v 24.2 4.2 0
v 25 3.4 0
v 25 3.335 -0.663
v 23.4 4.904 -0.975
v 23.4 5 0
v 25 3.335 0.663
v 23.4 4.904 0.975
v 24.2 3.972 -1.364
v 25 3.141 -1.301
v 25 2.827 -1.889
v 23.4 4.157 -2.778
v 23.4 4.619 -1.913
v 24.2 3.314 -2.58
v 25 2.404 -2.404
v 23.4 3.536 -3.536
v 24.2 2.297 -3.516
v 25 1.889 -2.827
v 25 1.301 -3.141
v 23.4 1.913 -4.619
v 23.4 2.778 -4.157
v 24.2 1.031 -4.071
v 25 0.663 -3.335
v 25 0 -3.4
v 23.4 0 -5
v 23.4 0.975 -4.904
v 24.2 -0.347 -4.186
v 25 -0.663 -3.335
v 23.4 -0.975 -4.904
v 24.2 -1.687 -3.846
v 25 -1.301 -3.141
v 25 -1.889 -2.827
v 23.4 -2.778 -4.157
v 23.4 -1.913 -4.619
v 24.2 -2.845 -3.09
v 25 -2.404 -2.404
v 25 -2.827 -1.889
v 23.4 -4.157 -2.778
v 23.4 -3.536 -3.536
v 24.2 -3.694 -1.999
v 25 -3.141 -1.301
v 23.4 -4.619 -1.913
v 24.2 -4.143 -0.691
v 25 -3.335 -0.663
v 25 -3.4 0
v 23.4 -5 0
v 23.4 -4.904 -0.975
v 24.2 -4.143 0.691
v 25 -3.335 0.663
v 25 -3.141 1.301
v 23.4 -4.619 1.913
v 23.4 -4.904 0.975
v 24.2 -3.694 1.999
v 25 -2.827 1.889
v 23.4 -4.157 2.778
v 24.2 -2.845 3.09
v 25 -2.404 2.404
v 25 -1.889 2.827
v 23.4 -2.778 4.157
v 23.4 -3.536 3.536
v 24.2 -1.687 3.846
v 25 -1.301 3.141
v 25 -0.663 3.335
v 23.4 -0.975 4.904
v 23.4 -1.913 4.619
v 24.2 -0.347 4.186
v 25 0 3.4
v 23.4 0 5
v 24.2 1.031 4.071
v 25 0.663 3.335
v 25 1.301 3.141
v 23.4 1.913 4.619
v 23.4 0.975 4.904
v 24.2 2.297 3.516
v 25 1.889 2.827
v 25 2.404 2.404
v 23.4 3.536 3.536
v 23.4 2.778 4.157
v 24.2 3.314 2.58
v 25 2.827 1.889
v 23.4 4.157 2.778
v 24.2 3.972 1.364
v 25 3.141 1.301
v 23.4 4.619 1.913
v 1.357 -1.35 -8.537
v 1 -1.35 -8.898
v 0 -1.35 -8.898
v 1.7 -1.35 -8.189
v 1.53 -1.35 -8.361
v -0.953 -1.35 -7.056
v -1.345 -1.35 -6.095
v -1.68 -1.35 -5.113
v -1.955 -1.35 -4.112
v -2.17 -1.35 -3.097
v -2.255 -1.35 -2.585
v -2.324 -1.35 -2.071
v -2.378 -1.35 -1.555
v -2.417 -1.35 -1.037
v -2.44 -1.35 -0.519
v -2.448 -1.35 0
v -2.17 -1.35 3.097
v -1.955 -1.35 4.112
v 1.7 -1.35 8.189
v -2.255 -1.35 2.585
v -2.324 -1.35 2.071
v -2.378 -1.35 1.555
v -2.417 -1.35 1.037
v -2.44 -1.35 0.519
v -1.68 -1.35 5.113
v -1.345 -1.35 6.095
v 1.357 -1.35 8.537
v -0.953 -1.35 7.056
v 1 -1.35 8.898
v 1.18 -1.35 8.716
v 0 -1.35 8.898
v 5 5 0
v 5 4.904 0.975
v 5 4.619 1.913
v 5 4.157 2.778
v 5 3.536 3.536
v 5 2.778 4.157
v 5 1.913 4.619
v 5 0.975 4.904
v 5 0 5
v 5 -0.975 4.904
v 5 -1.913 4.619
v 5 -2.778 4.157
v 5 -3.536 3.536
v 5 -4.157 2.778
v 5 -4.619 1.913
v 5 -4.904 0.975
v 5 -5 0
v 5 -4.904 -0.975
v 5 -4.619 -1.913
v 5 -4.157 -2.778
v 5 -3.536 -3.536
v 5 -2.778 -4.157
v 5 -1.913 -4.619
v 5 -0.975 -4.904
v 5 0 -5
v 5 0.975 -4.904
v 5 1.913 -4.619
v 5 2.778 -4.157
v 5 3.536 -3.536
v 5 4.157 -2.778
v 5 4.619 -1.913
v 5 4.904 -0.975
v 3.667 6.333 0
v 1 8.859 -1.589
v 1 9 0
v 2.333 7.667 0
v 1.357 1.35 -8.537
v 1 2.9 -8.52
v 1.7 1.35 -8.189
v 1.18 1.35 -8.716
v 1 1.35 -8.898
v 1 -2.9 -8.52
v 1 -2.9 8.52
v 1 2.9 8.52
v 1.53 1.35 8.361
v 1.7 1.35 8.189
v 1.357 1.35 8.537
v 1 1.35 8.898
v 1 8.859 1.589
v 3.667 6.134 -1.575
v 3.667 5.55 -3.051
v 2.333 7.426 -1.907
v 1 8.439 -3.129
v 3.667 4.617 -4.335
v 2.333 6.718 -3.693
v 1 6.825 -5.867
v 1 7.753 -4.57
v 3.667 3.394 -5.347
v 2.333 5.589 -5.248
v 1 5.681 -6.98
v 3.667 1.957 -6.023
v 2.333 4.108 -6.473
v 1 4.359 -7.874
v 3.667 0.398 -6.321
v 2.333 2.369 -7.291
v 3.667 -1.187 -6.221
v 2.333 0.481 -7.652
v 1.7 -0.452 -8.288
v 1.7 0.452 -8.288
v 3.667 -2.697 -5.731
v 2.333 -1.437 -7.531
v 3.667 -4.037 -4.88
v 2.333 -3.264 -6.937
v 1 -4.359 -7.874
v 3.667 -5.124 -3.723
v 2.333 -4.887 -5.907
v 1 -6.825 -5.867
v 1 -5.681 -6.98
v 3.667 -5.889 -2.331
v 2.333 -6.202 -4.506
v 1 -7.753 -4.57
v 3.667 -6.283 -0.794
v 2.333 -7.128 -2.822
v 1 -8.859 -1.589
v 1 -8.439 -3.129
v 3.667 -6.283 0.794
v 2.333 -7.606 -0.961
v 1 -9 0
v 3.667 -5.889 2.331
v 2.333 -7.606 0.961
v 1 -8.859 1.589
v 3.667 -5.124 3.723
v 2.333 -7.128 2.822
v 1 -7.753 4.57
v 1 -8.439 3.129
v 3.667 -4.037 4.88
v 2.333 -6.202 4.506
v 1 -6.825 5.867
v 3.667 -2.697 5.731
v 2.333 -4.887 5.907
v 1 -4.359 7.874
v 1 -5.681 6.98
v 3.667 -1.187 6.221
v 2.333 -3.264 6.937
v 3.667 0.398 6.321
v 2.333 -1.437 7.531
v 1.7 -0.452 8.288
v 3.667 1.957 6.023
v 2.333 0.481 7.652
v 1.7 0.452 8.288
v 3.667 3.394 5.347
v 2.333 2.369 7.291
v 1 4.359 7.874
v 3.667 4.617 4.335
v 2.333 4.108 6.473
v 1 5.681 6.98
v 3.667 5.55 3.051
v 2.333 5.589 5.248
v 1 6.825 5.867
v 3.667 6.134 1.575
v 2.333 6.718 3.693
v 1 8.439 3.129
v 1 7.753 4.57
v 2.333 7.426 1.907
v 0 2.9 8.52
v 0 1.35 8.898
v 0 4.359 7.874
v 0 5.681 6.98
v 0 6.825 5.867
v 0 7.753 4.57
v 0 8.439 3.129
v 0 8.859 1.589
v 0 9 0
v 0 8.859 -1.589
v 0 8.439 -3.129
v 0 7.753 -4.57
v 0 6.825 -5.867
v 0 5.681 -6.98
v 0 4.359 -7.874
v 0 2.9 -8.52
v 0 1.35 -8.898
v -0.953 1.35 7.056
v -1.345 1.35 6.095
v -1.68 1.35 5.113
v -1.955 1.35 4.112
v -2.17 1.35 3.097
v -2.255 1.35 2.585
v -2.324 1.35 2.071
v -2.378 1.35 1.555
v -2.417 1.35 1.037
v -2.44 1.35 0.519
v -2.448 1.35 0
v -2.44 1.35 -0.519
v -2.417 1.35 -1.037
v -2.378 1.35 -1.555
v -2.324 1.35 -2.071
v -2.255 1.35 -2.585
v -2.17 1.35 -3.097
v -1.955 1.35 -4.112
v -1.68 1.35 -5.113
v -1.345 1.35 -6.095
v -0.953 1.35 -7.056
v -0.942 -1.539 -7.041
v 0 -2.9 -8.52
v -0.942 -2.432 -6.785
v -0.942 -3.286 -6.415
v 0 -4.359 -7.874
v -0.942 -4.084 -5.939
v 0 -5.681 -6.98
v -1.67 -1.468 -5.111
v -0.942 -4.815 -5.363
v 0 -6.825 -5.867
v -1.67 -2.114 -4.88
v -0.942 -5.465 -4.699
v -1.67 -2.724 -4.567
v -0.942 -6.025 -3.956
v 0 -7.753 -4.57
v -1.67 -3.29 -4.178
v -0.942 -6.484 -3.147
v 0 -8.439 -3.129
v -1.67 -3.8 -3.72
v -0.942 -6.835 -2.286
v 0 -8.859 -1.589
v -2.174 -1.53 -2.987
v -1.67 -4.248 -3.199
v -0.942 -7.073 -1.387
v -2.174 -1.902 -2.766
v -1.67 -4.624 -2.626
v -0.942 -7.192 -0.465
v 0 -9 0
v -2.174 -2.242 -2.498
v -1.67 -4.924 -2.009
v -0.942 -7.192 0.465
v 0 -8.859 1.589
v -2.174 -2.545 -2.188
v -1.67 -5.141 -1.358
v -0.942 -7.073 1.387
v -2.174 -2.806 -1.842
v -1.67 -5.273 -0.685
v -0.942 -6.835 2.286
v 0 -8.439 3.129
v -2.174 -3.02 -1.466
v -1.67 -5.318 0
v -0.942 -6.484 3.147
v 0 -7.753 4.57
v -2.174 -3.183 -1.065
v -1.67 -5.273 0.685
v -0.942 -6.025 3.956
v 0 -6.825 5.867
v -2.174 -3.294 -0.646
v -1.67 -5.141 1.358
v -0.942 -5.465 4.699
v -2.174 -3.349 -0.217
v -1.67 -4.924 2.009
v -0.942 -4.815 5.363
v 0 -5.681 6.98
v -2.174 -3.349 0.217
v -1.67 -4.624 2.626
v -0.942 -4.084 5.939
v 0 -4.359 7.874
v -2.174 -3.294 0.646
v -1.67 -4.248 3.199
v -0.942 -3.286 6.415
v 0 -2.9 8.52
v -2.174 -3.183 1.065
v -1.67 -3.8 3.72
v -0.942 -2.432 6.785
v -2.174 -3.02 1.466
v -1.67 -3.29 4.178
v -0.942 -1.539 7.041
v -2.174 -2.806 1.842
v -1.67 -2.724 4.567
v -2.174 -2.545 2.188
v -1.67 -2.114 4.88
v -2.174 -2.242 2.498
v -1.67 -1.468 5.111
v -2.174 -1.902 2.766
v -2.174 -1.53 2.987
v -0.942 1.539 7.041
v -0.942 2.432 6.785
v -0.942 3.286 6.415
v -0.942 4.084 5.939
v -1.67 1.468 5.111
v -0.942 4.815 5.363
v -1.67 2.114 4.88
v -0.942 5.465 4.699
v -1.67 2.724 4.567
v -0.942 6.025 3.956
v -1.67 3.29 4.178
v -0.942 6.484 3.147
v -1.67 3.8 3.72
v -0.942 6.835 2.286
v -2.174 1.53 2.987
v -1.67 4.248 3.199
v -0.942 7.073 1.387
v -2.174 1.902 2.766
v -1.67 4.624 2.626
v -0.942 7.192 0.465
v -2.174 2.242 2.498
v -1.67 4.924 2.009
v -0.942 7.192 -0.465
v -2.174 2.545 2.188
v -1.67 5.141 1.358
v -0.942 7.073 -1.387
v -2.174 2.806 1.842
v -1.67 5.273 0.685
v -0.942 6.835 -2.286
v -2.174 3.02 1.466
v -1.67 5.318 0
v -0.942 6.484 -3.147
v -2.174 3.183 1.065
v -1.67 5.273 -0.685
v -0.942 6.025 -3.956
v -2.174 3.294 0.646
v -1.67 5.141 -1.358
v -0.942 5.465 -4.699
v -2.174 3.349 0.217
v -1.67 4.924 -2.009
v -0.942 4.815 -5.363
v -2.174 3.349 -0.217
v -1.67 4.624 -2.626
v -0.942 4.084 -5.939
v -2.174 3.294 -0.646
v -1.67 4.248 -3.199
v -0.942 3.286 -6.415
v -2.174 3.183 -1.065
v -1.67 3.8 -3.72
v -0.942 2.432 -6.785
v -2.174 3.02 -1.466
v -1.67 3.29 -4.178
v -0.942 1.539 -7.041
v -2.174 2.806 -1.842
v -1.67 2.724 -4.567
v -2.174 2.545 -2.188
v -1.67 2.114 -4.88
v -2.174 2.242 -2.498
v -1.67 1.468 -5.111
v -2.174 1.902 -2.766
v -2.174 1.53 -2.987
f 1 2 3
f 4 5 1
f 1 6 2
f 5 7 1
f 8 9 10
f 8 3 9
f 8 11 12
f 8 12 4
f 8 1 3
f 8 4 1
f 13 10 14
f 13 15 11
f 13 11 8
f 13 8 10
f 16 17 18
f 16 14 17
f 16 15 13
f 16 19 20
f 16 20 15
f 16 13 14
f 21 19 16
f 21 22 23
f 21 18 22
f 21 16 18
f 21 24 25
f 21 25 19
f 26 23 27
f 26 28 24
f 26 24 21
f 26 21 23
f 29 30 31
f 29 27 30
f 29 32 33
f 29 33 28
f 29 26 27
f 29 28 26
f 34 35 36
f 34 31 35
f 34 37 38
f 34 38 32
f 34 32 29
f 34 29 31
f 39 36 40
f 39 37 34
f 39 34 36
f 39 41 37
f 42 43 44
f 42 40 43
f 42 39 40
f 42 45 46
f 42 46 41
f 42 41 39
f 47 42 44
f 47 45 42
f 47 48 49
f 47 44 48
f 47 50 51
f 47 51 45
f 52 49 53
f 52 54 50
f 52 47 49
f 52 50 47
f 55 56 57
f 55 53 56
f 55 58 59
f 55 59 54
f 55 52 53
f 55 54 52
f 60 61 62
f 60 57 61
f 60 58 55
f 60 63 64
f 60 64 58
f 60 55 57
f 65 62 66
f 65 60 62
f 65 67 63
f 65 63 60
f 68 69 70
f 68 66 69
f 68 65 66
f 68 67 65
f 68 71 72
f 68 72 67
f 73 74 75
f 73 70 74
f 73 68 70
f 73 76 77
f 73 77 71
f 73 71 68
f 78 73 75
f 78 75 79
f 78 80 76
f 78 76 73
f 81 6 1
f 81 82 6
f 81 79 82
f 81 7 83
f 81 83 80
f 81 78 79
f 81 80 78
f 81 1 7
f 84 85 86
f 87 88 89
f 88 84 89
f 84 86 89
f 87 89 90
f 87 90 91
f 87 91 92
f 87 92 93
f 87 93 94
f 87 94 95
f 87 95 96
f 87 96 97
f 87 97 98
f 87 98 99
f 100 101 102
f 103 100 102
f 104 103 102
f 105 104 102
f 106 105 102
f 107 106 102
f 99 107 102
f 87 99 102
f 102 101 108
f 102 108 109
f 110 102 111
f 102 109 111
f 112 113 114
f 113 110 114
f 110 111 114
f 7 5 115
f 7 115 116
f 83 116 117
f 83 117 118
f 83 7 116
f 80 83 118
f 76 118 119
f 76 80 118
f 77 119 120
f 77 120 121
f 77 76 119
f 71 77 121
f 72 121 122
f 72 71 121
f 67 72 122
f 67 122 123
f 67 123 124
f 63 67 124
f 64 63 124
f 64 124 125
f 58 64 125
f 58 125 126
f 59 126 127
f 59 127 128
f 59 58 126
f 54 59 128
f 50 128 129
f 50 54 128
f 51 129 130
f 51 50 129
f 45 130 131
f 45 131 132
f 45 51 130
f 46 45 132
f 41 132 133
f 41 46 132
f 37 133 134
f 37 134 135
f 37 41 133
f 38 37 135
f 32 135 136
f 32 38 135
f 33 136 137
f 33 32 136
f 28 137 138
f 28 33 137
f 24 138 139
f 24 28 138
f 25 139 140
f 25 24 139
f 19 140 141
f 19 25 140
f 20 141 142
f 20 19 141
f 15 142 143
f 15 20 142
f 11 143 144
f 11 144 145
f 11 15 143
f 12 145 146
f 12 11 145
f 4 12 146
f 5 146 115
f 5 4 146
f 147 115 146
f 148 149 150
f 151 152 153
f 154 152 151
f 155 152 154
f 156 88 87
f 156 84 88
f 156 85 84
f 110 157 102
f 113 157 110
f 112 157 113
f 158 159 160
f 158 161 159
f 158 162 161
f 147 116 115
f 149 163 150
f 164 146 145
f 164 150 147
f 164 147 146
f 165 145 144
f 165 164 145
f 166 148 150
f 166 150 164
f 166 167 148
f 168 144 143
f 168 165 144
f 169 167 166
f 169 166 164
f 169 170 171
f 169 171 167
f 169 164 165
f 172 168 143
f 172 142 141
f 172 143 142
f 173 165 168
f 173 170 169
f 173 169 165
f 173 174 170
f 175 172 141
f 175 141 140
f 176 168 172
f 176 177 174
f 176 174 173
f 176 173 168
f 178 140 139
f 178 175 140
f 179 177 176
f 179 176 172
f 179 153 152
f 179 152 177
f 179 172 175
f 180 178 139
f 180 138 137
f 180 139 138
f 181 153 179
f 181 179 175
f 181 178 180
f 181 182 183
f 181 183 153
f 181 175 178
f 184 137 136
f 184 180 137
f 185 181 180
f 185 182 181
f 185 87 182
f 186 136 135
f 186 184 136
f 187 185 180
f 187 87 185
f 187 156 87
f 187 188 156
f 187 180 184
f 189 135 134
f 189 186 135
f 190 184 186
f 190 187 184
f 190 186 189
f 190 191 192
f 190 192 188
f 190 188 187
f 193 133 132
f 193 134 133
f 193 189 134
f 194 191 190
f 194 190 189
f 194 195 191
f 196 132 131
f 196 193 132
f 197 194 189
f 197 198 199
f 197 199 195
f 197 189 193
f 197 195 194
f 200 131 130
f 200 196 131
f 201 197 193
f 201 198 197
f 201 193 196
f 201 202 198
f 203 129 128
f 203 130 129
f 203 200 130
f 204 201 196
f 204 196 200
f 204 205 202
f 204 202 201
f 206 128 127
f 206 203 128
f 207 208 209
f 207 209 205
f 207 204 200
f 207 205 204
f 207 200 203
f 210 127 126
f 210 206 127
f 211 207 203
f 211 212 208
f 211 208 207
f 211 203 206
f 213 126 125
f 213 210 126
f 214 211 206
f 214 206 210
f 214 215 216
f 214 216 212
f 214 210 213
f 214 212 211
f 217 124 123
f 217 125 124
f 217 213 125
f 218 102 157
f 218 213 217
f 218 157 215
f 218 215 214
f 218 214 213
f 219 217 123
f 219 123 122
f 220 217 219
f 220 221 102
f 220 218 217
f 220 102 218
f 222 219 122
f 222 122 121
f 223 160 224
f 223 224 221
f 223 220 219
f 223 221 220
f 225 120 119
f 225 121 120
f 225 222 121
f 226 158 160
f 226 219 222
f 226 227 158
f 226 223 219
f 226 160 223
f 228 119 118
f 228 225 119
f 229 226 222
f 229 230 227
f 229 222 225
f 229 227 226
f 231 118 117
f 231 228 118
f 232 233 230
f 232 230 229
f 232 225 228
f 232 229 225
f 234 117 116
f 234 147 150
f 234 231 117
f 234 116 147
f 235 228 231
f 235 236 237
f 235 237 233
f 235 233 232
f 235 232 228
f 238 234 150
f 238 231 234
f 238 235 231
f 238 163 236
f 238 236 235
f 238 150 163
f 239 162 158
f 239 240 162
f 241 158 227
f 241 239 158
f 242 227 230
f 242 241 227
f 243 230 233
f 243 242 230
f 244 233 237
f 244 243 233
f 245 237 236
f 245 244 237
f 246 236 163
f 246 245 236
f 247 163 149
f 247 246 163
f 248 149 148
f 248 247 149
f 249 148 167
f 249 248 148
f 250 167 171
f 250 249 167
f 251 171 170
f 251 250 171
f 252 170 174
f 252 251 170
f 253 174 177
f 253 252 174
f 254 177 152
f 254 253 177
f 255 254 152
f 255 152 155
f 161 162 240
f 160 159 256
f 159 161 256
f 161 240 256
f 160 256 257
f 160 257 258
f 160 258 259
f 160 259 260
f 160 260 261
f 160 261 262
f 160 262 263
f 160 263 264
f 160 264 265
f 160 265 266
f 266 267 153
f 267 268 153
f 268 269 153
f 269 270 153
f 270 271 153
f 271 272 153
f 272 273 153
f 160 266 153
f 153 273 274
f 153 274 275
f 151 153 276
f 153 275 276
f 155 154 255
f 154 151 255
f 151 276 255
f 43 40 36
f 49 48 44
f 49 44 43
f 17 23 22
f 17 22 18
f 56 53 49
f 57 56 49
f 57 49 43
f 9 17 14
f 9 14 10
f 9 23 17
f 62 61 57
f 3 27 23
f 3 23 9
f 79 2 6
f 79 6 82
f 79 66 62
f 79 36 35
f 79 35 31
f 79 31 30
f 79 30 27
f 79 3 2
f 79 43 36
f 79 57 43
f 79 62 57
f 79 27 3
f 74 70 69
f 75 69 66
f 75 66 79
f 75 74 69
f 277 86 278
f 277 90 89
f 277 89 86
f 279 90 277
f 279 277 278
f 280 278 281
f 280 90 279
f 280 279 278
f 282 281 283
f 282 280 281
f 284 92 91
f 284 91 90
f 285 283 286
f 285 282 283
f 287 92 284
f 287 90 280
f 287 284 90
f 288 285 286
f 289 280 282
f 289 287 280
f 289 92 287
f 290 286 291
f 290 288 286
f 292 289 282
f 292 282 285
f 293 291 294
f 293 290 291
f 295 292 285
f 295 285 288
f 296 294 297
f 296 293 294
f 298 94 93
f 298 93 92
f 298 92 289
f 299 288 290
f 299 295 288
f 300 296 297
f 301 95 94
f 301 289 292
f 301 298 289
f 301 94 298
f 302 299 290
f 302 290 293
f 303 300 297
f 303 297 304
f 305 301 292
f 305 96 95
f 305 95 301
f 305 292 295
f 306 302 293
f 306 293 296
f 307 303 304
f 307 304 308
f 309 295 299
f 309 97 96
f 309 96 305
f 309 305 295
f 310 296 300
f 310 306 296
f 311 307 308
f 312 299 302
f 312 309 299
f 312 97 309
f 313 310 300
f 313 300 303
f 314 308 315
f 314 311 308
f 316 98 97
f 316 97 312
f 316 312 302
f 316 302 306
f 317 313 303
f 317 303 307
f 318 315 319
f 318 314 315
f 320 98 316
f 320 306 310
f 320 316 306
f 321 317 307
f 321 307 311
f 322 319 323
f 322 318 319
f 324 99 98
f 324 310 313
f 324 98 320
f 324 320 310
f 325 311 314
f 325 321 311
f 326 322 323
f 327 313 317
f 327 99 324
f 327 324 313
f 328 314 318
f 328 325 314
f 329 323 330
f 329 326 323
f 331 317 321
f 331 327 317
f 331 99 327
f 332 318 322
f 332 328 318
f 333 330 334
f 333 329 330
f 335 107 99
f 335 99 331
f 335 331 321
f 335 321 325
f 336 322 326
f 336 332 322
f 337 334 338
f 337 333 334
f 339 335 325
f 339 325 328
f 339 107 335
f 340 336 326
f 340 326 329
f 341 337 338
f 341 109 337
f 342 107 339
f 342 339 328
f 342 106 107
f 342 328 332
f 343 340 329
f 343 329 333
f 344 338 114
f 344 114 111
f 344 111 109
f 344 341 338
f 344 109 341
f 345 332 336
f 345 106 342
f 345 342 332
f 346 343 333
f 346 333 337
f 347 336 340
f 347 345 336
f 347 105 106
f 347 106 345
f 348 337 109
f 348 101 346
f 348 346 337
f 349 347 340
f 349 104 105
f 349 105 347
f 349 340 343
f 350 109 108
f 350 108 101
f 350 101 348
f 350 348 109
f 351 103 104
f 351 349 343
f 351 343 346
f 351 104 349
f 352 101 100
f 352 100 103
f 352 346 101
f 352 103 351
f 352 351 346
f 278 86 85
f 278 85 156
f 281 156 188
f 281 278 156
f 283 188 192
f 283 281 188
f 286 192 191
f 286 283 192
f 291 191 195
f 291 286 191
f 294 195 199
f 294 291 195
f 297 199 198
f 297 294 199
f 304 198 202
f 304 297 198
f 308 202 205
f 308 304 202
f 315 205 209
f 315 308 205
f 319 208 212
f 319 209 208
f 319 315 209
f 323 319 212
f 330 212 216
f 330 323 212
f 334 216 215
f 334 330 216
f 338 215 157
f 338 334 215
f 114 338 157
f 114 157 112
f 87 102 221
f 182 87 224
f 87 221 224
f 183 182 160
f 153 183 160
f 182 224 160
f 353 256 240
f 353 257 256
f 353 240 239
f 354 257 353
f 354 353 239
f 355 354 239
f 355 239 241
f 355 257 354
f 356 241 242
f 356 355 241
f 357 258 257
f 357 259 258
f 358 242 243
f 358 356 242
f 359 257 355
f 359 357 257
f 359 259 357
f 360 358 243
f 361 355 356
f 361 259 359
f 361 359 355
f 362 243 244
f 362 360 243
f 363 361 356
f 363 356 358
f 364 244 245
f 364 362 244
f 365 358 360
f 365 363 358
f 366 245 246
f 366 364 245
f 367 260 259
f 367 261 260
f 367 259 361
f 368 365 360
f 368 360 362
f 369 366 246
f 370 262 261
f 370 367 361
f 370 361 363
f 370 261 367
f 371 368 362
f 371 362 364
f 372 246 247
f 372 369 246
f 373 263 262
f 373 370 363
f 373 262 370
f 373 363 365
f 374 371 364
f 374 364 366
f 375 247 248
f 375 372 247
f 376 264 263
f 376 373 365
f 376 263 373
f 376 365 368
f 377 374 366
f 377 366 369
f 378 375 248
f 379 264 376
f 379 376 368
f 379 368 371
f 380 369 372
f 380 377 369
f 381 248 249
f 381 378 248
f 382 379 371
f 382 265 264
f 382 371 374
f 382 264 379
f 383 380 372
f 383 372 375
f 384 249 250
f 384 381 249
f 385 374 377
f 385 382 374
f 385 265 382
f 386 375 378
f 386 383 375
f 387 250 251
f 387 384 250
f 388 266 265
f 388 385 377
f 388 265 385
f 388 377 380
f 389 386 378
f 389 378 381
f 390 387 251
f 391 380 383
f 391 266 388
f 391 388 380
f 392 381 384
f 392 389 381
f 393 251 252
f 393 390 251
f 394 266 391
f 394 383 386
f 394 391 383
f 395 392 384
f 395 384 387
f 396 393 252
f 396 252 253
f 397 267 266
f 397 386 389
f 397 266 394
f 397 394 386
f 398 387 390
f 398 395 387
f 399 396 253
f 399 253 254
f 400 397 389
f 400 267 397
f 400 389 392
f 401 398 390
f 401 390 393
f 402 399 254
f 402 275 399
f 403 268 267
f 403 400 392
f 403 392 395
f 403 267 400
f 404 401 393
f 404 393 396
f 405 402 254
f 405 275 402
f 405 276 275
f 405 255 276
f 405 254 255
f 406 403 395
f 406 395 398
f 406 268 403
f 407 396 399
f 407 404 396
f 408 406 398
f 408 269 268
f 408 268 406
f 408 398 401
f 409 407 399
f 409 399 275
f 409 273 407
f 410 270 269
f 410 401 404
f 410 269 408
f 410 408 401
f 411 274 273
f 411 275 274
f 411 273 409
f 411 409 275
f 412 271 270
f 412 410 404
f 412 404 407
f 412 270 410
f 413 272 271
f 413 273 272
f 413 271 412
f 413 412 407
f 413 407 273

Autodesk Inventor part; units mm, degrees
ref_plane "YZ Plane" through (0, 0, 0) normal (1, 0, 0) x (0, 1, 0)
sketch "Эскиз1" plane through (0, 0, 0) normal (0, 0, 1) x (1, 0, 0)
  line L0 (25, 0) -> (25, 5)
  line L1 (25, 5) -> (6.5, 5)
  line L2 (1, 9) -> (0, 9)
  line L3 (0, 9) -> (0, 0) construction
  arc A0 (0, 9) -> (-2.5, 0) centre (14.95, 0) ccw
  line L4 (-12.7193, 0) -> (31.2866, 0) projected
  line L5 (0, -1.8341) -> (0, 11.0045) projected
  line L6 (-2.5, 0) -> (-2.5, 9) construction
  line L7 (-2.5, 9) -> (0, 9) construction
  line L8 (0, 9) -> (0, 0)
  line L9 (-2.5, 0) -> (0, 0)
  line L10 (0, 0) -> (25, 0)
  line L11 (5, 5) -> (5.5798, 5)
  line L12 (5.5798, 5) -> (6.5, 5)
  line L13 (6.5, 5) -> (-6.4328, 5) construction
  line L14 (1, 9) -> (5, 5)
  line L15 (5, 5) -> (5, 5)
  line L16 (6.5, 5) -> (5, 5) construction
  dimension "d0" = 18.5
  dimension "d1" = 25
  dimension "d2" = 2.5
  dimension "d3" = 10
  dimension "d4" = 18
  dimension "d5" = 10
  dimension "d6" = 0.9202
  dimension "d15" = 5
  dimension "d16" = 45
revolve "Базовый элемент" add sketch "Эскиз1" angle 360 about axis through (0, 0, 0) along (1, 0, 0)
ref_plane "IDS_WORKPLANE{1}" through (-2.5, 0, 0) normal (1, 0, 0) x (0, 1, 0)
sketch "Эскиз2" plane through (-2.5, 0, 0) normal (1, 0, 0) x (0, 1, 0)
  line L0 (0, -12.6) -> (0, 12.6) projected
  line L1 (-12.6, 0) -> (12.6, 0) projected
  line L2 (1.35, -9) -> (-1.35, -9)
  line L3 (-1.35, -9) -> (-1.35, 9)
  line L4 (-1.35, 9) -> (1.35, 9)
  line L5 (1.35, 9) -> (1.35, -9)
  line L6 (0, 9) -> (0, -9) construction
  line L7 (-1.35, 0) -> (1.35, 0) construction
  circle A0 centre (0, 0) radius 9 projected
  dimension "d12" = 2.7
extrude "Паз" cut sketch "Эскиз2" along normal blind 4.2 contours A0 L3 L1 L0 | A0 L5 L2 | L2 L3 A0 | L0 L1 L5 A0 | L1 L3 A0 L0 | L0 A0 L5 L1 | A0 L3 L4 | L4 L5 A0
thread "Резьба" size "M10x1.5" class "6g" standard "ISO Metric profile" length 20
chamfer "Фаска1" distance 1.6 angle 45 1 edges at (25, -5, 0)
ref_plane "Work Plane2" through (10.9537, 0, 0) normal (0, 0, -1) x (1, 0, 0)
equation "\"d0\" = GEL"
equation "\"d5\" = BDM"
equation "\"d6\" = GAL"
equation "\"NLG\" = 25"
equation "\"GEL\" = 18.5"
equation "\"KOD\" = 18"
equation "\"KOH\" = 5"
equation "\"STI\" = 4.9"
equation "\"SBR\" = 1.35"
equation "\"KAH\" = 2.5"
equation "\"GAL\" = 0.61345 * PTC"
equation "\"GUL\" = 0.61345 * PTC"
equation "\"BDM\" = NND"
equation "\"SPD\" = NND - 1.2269 * PTC"
equation "\"SEWI\" = 90deg"
equation "\"d11\" = -KAH"
equation "\"KR\" = 19"
equation "\"PTC\" = 1.5"
equation "\"TOA\" = 30deg"
equation "\"RR\" = 0.1 * NND"
equation "\"GD1\" = THREADDIA - 1.2269 * PTC"
equation "\"FAWI\" = 45deg"
equation "\"NND\" = 10"
equation "\"THREADDIA\" = 10"
properties part number "Винт M10-6gx25 ГОСТ 17474-80" material "Сталь, мягкая"
